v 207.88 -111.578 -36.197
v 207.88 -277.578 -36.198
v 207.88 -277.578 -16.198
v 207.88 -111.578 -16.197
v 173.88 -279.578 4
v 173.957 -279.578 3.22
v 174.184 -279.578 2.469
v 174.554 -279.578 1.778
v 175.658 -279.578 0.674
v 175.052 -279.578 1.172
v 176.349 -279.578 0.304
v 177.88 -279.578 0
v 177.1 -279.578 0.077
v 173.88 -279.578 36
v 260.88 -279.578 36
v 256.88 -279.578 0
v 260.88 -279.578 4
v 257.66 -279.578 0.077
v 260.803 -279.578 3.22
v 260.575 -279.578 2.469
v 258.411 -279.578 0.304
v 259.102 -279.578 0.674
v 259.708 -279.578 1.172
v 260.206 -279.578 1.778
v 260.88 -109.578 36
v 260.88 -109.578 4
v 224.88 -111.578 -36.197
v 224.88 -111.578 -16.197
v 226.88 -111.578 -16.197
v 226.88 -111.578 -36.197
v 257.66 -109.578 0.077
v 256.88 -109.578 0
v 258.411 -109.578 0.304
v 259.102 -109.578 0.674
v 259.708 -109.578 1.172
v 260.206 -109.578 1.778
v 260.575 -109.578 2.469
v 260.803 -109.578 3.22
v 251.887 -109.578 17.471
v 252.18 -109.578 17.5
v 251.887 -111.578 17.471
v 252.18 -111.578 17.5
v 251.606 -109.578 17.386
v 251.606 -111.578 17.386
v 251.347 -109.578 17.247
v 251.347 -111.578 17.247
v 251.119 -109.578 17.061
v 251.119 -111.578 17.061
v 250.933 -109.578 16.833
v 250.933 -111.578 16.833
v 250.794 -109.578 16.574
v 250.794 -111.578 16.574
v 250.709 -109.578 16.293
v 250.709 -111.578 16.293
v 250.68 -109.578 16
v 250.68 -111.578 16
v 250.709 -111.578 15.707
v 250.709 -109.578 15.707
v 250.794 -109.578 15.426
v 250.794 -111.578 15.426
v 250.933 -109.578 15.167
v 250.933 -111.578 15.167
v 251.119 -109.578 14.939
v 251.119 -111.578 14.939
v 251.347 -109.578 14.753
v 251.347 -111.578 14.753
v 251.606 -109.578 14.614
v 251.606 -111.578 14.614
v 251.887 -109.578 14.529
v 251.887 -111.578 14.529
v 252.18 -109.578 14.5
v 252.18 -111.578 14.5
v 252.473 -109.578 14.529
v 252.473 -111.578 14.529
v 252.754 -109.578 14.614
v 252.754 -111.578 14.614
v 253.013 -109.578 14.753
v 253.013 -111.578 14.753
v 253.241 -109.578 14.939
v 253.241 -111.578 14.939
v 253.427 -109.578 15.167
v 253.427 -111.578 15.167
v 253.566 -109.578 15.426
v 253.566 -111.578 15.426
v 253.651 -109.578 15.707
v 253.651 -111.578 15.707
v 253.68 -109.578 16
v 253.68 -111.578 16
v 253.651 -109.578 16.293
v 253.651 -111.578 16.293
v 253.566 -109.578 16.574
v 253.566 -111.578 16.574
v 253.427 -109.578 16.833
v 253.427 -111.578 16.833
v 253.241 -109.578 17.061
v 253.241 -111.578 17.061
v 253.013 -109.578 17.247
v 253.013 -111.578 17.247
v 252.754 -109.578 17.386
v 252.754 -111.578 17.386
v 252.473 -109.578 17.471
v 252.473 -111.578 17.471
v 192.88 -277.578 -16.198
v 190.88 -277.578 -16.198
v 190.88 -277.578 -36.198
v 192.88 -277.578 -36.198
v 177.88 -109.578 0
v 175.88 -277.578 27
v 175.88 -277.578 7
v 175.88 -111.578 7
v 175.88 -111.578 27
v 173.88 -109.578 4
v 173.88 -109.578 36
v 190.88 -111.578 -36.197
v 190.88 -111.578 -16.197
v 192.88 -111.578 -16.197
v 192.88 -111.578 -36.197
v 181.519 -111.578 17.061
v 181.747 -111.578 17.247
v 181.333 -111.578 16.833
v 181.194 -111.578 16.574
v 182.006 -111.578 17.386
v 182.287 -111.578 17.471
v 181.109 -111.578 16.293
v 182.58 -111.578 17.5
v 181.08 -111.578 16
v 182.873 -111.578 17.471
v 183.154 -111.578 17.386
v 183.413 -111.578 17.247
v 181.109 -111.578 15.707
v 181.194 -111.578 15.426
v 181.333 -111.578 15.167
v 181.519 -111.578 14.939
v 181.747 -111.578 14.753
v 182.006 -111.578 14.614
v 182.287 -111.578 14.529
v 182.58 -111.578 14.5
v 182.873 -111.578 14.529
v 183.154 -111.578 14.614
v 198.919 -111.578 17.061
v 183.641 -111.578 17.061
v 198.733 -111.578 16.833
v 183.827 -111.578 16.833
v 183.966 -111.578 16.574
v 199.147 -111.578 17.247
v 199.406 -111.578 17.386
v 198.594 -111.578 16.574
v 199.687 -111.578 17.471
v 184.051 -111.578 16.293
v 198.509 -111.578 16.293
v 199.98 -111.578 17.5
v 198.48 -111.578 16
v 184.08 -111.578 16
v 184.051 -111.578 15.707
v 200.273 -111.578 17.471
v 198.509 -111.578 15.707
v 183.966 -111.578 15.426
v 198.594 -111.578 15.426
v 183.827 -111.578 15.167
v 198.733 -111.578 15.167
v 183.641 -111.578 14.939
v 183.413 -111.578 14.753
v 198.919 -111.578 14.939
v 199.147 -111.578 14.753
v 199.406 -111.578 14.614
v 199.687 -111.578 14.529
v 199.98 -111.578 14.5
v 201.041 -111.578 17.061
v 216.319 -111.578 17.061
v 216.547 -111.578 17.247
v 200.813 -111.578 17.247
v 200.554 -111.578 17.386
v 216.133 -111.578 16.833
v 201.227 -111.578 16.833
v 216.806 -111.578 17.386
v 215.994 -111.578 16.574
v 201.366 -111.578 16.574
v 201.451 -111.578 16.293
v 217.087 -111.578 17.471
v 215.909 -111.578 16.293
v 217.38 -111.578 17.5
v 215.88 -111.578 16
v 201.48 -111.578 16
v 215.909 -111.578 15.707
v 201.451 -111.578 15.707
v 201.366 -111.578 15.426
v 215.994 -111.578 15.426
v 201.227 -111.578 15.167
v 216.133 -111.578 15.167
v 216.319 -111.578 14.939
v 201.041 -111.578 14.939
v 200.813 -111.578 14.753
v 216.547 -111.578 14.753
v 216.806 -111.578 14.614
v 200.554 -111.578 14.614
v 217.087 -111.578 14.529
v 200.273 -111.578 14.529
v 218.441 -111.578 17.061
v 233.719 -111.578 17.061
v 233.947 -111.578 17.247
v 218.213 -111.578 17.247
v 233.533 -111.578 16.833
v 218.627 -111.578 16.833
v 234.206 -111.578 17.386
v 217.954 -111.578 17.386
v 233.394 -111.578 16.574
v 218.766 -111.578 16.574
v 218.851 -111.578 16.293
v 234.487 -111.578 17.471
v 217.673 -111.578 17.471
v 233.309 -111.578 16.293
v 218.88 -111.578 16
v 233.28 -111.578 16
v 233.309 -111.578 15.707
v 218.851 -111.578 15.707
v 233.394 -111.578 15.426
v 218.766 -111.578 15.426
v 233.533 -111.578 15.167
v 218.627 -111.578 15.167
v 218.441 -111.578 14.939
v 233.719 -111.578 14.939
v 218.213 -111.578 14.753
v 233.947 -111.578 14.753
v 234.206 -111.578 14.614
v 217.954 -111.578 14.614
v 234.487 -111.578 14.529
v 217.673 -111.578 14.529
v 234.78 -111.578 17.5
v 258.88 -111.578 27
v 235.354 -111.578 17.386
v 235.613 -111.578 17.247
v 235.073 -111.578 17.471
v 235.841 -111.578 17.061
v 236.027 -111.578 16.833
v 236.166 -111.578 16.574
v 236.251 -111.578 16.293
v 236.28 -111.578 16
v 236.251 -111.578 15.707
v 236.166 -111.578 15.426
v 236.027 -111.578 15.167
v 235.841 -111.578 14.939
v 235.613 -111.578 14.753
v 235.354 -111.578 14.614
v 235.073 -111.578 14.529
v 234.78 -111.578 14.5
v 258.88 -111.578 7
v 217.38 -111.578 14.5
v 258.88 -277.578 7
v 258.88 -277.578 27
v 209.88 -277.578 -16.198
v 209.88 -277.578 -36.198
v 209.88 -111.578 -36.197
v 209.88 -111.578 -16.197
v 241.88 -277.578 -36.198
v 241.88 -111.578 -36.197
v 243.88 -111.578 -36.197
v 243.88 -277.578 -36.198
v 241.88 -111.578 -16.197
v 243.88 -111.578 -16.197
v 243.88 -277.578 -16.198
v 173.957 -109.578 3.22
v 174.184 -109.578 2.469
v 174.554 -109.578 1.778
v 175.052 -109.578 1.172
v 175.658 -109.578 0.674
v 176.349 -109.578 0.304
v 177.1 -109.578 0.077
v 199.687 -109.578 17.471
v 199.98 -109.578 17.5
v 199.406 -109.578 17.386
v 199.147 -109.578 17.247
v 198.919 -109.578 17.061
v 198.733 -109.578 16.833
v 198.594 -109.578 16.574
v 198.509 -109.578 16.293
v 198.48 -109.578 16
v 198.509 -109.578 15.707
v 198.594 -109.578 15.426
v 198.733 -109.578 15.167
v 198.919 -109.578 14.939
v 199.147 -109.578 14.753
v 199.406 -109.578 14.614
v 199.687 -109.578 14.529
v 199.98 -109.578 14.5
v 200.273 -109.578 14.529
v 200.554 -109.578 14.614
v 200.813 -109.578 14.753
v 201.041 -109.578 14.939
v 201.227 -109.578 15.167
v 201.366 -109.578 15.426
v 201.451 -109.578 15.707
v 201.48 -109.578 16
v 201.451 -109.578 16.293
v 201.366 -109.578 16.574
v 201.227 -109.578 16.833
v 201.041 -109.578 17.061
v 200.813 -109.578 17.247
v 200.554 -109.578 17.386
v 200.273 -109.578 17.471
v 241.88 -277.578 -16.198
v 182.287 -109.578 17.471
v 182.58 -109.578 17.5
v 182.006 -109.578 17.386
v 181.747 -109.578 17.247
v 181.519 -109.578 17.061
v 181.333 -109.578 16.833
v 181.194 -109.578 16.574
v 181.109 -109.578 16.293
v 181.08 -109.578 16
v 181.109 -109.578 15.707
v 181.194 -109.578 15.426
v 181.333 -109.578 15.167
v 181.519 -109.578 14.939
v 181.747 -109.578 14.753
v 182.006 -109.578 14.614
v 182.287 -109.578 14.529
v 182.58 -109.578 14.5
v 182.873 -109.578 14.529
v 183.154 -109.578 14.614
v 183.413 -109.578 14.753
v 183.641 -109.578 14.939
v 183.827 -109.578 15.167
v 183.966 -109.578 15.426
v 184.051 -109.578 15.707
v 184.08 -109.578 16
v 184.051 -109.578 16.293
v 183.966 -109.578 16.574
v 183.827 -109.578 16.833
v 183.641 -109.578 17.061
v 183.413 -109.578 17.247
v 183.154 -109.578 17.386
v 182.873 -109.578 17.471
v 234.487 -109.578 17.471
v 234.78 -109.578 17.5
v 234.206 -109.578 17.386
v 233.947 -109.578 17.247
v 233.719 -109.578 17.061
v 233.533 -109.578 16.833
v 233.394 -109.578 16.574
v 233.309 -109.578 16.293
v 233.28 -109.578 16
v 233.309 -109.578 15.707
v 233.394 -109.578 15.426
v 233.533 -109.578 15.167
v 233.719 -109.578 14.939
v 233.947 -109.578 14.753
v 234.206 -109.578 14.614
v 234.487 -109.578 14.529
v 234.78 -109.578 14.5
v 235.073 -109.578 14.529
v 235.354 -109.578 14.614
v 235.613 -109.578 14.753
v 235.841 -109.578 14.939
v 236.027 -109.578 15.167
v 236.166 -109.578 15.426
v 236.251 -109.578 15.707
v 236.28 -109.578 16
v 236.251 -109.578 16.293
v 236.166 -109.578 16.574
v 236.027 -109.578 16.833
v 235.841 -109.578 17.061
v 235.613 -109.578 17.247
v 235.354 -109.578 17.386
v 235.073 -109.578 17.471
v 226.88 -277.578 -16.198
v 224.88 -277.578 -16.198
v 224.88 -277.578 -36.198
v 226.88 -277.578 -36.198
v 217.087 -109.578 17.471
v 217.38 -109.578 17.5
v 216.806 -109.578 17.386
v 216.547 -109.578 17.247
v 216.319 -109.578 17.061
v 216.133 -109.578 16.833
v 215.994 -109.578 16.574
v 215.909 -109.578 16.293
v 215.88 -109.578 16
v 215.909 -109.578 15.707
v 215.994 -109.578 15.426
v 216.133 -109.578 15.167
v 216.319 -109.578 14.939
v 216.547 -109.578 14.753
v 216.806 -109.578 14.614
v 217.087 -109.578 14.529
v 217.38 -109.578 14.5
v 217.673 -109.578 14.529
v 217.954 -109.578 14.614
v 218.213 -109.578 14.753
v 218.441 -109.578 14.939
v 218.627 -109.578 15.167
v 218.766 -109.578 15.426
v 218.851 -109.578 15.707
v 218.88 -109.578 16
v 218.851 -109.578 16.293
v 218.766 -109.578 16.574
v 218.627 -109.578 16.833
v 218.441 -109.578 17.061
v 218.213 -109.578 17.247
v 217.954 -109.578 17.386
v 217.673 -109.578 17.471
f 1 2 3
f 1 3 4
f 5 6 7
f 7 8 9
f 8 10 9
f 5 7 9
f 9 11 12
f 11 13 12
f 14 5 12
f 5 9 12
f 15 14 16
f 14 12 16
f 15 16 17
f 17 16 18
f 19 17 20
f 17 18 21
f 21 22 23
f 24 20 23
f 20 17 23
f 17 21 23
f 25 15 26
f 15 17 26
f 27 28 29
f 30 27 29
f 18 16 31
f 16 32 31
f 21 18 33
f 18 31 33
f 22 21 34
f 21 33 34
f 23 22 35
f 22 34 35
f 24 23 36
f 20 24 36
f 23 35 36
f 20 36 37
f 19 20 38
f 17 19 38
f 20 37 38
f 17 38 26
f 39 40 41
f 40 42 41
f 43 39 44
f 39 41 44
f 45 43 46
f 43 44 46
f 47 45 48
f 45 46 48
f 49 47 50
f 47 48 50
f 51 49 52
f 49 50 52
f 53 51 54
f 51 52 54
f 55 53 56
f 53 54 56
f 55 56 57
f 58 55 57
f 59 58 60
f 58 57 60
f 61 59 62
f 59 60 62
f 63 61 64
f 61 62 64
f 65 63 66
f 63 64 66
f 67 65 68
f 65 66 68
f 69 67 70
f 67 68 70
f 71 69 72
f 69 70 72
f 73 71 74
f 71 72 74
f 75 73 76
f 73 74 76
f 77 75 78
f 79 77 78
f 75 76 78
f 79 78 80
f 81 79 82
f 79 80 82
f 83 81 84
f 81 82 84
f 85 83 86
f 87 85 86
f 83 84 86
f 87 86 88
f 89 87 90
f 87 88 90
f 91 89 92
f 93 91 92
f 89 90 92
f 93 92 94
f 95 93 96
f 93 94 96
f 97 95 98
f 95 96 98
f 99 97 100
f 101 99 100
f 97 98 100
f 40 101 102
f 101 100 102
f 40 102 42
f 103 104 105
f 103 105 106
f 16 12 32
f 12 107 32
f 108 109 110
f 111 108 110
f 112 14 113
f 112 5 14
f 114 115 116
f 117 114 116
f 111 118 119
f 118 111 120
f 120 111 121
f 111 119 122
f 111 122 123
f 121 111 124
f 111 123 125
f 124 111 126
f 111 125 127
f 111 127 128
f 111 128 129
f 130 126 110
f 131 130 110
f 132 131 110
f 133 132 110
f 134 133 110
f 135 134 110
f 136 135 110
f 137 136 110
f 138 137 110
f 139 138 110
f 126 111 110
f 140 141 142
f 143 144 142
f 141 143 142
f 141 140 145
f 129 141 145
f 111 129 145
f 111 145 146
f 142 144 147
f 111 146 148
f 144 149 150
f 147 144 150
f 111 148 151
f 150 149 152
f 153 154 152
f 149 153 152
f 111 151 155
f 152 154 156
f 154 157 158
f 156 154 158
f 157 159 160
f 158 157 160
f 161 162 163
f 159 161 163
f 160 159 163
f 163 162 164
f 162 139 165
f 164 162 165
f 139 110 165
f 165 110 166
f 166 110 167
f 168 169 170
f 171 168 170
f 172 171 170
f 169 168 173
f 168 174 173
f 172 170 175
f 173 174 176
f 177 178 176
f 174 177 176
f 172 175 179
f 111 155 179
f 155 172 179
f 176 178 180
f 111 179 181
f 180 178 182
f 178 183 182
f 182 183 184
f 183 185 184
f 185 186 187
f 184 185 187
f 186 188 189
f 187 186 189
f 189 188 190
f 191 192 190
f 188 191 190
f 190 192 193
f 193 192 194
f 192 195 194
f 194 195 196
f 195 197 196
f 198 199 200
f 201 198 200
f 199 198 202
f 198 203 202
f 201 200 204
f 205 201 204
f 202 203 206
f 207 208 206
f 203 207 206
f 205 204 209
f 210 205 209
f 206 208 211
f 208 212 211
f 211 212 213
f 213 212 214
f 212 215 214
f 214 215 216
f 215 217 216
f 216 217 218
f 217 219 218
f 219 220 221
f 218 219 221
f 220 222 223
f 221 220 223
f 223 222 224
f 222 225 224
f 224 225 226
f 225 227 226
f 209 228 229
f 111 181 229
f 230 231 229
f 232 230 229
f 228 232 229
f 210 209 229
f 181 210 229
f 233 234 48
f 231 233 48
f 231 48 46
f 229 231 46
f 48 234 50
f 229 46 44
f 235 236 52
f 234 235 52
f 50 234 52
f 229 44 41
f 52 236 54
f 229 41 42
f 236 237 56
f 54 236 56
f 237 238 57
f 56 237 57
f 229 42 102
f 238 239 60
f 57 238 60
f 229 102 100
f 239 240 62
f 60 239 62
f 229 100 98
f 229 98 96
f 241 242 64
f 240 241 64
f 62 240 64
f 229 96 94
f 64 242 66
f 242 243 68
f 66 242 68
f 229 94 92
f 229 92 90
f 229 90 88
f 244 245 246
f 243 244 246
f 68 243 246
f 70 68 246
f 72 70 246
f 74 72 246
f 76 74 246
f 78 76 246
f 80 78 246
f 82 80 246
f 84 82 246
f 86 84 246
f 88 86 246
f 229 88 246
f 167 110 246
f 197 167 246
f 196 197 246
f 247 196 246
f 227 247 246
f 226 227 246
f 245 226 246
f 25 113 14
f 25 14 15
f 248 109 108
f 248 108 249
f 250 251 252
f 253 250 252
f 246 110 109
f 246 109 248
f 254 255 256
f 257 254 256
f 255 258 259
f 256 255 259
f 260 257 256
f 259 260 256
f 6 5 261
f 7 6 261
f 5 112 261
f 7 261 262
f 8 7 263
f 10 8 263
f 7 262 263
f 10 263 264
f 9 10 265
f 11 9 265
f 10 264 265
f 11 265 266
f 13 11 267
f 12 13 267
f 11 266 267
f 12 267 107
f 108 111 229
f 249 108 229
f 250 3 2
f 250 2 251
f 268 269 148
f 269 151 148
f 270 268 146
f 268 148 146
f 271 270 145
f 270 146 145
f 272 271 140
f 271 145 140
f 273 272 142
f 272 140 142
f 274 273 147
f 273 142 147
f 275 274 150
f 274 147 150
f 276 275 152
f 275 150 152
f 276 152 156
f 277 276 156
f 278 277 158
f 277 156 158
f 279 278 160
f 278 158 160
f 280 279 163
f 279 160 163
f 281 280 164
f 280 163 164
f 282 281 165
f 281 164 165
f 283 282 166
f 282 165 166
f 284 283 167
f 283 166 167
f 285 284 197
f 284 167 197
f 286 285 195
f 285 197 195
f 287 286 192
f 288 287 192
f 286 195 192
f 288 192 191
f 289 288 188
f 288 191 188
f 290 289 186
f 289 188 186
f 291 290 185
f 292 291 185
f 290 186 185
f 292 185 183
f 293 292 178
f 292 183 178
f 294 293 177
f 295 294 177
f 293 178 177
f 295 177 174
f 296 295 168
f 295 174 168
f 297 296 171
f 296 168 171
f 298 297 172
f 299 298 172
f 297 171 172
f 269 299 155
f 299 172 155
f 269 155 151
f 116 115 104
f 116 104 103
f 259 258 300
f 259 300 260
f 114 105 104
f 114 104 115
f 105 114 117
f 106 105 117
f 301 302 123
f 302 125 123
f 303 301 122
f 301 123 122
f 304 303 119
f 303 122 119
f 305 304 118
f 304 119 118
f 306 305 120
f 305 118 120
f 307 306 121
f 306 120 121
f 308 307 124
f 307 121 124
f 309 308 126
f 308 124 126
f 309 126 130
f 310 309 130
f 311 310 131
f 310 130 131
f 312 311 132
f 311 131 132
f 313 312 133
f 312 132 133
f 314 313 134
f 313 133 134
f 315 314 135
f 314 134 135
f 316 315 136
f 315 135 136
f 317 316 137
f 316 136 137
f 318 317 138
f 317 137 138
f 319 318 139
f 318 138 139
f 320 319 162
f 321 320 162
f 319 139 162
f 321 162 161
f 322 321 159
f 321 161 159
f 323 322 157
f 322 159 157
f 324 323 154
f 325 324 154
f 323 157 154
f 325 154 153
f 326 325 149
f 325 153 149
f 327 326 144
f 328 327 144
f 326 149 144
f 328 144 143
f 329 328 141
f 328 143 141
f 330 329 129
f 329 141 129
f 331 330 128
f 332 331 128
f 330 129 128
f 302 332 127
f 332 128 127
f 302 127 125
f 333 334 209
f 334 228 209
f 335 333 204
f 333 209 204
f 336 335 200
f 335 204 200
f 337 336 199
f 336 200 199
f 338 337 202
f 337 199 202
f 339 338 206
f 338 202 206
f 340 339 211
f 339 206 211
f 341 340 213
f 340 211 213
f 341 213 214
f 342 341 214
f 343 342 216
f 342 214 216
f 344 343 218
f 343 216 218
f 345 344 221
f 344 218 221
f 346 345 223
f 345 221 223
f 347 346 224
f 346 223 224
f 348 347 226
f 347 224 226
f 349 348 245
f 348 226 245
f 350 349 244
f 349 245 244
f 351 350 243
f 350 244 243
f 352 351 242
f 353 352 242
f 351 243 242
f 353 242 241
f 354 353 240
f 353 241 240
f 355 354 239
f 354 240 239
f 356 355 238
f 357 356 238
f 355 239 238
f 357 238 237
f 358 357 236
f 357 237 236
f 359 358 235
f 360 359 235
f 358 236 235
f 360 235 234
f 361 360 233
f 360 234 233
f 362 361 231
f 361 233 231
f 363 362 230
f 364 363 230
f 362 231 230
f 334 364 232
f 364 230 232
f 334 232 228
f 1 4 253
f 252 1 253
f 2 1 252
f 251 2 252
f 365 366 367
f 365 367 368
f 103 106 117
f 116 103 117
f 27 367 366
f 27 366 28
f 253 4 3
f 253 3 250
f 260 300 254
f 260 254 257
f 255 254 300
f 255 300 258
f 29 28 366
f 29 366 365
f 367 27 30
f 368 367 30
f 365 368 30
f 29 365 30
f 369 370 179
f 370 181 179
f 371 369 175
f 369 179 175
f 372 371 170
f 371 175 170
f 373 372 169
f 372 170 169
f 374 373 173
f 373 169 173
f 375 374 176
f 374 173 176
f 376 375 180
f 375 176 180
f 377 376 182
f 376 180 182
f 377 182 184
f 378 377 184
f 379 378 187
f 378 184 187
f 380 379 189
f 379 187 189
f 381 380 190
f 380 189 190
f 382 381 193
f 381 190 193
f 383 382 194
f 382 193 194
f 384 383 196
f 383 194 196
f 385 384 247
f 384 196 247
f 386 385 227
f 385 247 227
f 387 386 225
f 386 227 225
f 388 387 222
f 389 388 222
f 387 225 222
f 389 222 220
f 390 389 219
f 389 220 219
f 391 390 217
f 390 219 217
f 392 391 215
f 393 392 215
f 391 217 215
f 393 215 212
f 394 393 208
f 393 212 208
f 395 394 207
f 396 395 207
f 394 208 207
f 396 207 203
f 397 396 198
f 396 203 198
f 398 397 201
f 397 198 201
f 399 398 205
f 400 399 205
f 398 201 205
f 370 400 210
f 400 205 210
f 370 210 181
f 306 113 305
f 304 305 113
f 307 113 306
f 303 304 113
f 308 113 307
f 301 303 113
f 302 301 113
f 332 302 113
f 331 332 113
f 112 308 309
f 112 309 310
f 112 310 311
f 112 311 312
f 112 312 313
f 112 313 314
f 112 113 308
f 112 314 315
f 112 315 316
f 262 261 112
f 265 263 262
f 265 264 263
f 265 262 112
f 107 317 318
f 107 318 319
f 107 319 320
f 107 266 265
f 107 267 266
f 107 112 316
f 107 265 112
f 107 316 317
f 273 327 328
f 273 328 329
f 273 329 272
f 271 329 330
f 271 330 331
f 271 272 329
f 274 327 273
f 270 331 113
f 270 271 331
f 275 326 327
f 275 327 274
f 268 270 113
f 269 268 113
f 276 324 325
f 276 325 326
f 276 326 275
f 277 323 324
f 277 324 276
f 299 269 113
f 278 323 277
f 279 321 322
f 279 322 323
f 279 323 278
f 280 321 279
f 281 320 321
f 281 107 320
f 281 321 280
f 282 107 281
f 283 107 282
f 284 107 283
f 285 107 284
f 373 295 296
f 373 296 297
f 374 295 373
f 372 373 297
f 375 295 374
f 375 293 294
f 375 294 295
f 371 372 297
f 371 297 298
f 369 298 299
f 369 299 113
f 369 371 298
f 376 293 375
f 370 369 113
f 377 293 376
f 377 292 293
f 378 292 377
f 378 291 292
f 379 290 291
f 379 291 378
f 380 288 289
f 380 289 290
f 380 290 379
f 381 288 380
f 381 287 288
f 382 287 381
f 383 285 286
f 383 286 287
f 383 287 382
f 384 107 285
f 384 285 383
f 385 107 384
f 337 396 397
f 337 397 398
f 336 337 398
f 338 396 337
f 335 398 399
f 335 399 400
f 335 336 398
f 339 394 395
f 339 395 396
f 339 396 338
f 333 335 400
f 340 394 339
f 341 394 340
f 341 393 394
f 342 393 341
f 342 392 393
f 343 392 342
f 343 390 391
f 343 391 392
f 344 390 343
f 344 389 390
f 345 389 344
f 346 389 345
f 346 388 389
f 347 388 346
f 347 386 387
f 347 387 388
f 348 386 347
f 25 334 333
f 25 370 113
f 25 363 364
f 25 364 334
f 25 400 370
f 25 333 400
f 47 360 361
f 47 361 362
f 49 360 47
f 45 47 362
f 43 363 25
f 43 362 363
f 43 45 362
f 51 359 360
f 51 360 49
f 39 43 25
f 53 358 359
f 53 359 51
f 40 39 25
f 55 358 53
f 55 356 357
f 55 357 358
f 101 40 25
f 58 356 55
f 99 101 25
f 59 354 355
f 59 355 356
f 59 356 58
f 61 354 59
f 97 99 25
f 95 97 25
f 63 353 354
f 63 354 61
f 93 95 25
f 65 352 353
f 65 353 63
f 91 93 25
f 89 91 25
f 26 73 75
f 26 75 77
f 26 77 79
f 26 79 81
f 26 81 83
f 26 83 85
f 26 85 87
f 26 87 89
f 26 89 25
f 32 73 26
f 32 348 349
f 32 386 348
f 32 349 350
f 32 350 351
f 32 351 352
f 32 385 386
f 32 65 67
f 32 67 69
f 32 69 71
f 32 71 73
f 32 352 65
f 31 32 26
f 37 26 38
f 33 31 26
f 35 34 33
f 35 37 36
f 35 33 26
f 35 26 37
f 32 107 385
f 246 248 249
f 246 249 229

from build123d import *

# Parameters (mm, degrees)
SKETCH1_W                      = 87
SKETCH1_H                      = 170
BOSS_EXTRUDE1_DEPTH            = 22
SHELL1_T                       = -2
SKETCH2_W                      = 2
SKETCH2_H                      = 165.999999995
EXTRUDE_THIN2_DEPTH            = 20
EXTRUDE_THIN2_2_DEPTH          = 20
EXTRUDE_THIN2_3_DEPTH          = 20
EXTRUDE_THIN2_4_DEPTH          = 20
SKETCH5_W                      = 1.5
SKETCH5_H                      = 2
F_3_0MM_DOWEL_HOLE1_AT_2_COUNT = 2
F_3_0MM_DOWEL_HOLE1_AT_2_PITCH = 17.4
F_3_0MM_DOWEL_HOLE1_AT_3_COUNT = 2
F_3_0MM_DOWEL_HOLE1_AT_3_PITCH = 34.8
F_3_0MM_DOWEL_HOLE1_AT_4_COUNT = 2
F_3_0MM_DOWEL_HOLE1_AT_4_PITCH = 52.2
F_3_0MM_DOWEL_HOLE1_AT_5_COUNT = 2
F_3_0MM_DOWEL_HOLE1_AT_5_PITCH = 69.6
SKETCH7_W                      = 87
SKETCH7_H                      = 170
BOSS_EXTRUDE2_DEPTH            = 5
FILLET1_R                      = 4
SKETCH6_W                      = 87
SKETCH6_H                      = 170
BOSS_EXTRUDE3_DEPTH            = 9


with BuildPart() as part:
    # Sketch1 → Boss-Extrude1 (new body)
    with BuildSketch(Plane.XY.offset(5)):
        with Locations((217.379927846, -194.578074772)):
            Rectangle(SKETCH1_W, SKETCH1_H)
    extrude(amount=BOSS_EXTRUDE1_DEPTH)

    # Shell1
    shell1_openings = [part.faces().sort_by_distance(p)[0] for p in [
        (217.379927846, -194.578074772, 27),
    ]]
    offset(amount=SHELL1_T, openings=shell1_openings, kind=Kind.INTERSECTION)

    # Sketch5 → Ø3.0mm Dowel Hole1 (revolve, cut)
    with BuildSketch(Plane(origin=(182.579927846, -109.578074772, 16), x_dir=(0, 0, 1), z_dir=(1, 0, 0))):
        with Locations((0.75, 1)):
            Rectangle(SKETCH5_W, SKETCH5_H)
    f_3_0mm_dowel_hole1 = revolve(axis=Axis((182.579927846, -103.228074772, 16), (0, -1, 0)), mode=Mode.SUBTRACT)

    # Ø3.0mm Dowel Hole1 at 2: Ø3.0mm Dowel Hole1 ×2
    with Locations(*[(i * F_3_0MM_DOWEL_HOLE1_AT_2_PITCH, 0, 0) for i in range(1, F_3_0MM_DOWEL_HOLE1_AT_2_COUNT)]):
        add(f_3_0mm_dowel_hole1, mode=Mode.SUBTRACT)

    # Ø3.0mm Dowel Hole1 at 3: Ø3.0mm Dowel Hole1 ×2
    with Locations(*[(i * F_3_0MM_DOWEL_HOLE1_AT_3_PITCH, 0, 0) for i in range(1, F_3_0MM_DOWEL_HOLE1_AT_3_COUNT)]):
        add(f_3_0mm_dowel_hole1, mode=Mode.SUBTRACT)

    # Ø3.0mm Dowel Hole1 at 4: Ø3.0mm Dowel Hole1 ×2
    with Locations(*[(i * F_3_0MM_DOWEL_HOLE1_AT_4_PITCH, 0, 0) for i in range(1, F_3_0MM_DOWEL_HOLE1_AT_4_COUNT)]):
        add(f_3_0mm_dowel_hole1, mode=Mode.SUBTRACT)

    # Ø3.0mm Dowel Hole1 at 5: Ø3.0mm Dowel Hole1 ×2
    with Locations(*[(i * F_3_0MM_DOWEL_HOLE1_AT_5_PITCH, 0, 0) for i in range(1, F_3_0MM_DOWEL_HOLE1_AT_5_COUNT)]):
        add(f_3_0mm_dowel_hole1, mode=Mode.SUBTRACT)

    # Sketch7 → Boss-Extrude2 (add)
    with BuildSketch(Plane.XY):
        with Locations((217.379927846, -194.578074772)):
            Rectangle(SKETCH7_W, SKETCH7_H)
    extrude(amount=BOSS_EXTRUDE2_DEPTH)

    # Fillet1
    fillet1_edges = [part.edges().sort_by_distance(p)[0] for p in [
        (173.879927846, -194.578074772, 0),
        (260.879927846, -194.578074772, 0),
    ]]
    fillet(fillet1_edges, radius=FILLET1_R)

    # Sketch6 → Boss-Extrude3 (add)
    with BuildSketch(Plane.XY.offset(27)):
        with Locations((217.379927846, -194.578074772)):
            Rectangle(SKETCH6_W, SKETCH6_H)
    extrude(amount=BOSS_EXTRUDE3_DEPTH)


with BuildPart() as body_2:
    # Sketch2 → Extrude-Thin2 (new body)
    with BuildSketch(Plane(origin=(0, 0.00031469, -36.195723728), x_dir=(1, 0, 0), z_dir=(0, -7.966e-06, 1))):
        with Locations((191.879927846, -194.577886062)):
            Rectangle(SKETCH2_W, SKETCH2_H)
    extrude(amount=EXTRUDE_THIN2_DEPTH)


with BuildPart() as body_3:
    # Sketch2 → Extrude-Thin2 2 (new body)
    with BuildSketch(Plane(origin=(0, 0.00031469, -36.195723728), x_dir=(1, 0, 0), z_dir=(0, -7.966e-06, 1))):
        with Locations((208.879927846, -194.577886062)):
            Rectangle(SKETCH2_W, SKETCH2_H)
    extrude(amount=EXTRUDE_THIN2_2_DEPTH)


with BuildPart() as body_4:
    # Sketch2 → Extrude-Thin2 3 (new body)
    with BuildSketch(Plane(origin=(0, 0.00031469, -36.195723728), x_dir=(1, 0, 0), z_dir=(0, -7.966e-06, 1))):
        with Locations((225.879927846, -194.577886062)):
            Rectangle(SKETCH2_W, SKETCH2_H)
    extrude(amount=EXTRUDE_THIN2_3_DEPTH)


with BuildPart() as body_5:
    # Sketch2 → Extrude-Thin2 4 (new body)
    with BuildSketch(Plane(origin=(0, 0.00031469, -36.195723728), x_dir=(1, 0, 0), z_dir=(0, -7.966e-06, 1))):
        with Locations((242.879927846, -194.577886062)):
            Rectangle(SKETCH2_W, SKETCH2_H)
    extrude(amount=EXTRUDE_THIN2_4_DEPTH)


solid = Compound([part.part, body_2.part, body_3.part, body_4.part, body_5.part])
